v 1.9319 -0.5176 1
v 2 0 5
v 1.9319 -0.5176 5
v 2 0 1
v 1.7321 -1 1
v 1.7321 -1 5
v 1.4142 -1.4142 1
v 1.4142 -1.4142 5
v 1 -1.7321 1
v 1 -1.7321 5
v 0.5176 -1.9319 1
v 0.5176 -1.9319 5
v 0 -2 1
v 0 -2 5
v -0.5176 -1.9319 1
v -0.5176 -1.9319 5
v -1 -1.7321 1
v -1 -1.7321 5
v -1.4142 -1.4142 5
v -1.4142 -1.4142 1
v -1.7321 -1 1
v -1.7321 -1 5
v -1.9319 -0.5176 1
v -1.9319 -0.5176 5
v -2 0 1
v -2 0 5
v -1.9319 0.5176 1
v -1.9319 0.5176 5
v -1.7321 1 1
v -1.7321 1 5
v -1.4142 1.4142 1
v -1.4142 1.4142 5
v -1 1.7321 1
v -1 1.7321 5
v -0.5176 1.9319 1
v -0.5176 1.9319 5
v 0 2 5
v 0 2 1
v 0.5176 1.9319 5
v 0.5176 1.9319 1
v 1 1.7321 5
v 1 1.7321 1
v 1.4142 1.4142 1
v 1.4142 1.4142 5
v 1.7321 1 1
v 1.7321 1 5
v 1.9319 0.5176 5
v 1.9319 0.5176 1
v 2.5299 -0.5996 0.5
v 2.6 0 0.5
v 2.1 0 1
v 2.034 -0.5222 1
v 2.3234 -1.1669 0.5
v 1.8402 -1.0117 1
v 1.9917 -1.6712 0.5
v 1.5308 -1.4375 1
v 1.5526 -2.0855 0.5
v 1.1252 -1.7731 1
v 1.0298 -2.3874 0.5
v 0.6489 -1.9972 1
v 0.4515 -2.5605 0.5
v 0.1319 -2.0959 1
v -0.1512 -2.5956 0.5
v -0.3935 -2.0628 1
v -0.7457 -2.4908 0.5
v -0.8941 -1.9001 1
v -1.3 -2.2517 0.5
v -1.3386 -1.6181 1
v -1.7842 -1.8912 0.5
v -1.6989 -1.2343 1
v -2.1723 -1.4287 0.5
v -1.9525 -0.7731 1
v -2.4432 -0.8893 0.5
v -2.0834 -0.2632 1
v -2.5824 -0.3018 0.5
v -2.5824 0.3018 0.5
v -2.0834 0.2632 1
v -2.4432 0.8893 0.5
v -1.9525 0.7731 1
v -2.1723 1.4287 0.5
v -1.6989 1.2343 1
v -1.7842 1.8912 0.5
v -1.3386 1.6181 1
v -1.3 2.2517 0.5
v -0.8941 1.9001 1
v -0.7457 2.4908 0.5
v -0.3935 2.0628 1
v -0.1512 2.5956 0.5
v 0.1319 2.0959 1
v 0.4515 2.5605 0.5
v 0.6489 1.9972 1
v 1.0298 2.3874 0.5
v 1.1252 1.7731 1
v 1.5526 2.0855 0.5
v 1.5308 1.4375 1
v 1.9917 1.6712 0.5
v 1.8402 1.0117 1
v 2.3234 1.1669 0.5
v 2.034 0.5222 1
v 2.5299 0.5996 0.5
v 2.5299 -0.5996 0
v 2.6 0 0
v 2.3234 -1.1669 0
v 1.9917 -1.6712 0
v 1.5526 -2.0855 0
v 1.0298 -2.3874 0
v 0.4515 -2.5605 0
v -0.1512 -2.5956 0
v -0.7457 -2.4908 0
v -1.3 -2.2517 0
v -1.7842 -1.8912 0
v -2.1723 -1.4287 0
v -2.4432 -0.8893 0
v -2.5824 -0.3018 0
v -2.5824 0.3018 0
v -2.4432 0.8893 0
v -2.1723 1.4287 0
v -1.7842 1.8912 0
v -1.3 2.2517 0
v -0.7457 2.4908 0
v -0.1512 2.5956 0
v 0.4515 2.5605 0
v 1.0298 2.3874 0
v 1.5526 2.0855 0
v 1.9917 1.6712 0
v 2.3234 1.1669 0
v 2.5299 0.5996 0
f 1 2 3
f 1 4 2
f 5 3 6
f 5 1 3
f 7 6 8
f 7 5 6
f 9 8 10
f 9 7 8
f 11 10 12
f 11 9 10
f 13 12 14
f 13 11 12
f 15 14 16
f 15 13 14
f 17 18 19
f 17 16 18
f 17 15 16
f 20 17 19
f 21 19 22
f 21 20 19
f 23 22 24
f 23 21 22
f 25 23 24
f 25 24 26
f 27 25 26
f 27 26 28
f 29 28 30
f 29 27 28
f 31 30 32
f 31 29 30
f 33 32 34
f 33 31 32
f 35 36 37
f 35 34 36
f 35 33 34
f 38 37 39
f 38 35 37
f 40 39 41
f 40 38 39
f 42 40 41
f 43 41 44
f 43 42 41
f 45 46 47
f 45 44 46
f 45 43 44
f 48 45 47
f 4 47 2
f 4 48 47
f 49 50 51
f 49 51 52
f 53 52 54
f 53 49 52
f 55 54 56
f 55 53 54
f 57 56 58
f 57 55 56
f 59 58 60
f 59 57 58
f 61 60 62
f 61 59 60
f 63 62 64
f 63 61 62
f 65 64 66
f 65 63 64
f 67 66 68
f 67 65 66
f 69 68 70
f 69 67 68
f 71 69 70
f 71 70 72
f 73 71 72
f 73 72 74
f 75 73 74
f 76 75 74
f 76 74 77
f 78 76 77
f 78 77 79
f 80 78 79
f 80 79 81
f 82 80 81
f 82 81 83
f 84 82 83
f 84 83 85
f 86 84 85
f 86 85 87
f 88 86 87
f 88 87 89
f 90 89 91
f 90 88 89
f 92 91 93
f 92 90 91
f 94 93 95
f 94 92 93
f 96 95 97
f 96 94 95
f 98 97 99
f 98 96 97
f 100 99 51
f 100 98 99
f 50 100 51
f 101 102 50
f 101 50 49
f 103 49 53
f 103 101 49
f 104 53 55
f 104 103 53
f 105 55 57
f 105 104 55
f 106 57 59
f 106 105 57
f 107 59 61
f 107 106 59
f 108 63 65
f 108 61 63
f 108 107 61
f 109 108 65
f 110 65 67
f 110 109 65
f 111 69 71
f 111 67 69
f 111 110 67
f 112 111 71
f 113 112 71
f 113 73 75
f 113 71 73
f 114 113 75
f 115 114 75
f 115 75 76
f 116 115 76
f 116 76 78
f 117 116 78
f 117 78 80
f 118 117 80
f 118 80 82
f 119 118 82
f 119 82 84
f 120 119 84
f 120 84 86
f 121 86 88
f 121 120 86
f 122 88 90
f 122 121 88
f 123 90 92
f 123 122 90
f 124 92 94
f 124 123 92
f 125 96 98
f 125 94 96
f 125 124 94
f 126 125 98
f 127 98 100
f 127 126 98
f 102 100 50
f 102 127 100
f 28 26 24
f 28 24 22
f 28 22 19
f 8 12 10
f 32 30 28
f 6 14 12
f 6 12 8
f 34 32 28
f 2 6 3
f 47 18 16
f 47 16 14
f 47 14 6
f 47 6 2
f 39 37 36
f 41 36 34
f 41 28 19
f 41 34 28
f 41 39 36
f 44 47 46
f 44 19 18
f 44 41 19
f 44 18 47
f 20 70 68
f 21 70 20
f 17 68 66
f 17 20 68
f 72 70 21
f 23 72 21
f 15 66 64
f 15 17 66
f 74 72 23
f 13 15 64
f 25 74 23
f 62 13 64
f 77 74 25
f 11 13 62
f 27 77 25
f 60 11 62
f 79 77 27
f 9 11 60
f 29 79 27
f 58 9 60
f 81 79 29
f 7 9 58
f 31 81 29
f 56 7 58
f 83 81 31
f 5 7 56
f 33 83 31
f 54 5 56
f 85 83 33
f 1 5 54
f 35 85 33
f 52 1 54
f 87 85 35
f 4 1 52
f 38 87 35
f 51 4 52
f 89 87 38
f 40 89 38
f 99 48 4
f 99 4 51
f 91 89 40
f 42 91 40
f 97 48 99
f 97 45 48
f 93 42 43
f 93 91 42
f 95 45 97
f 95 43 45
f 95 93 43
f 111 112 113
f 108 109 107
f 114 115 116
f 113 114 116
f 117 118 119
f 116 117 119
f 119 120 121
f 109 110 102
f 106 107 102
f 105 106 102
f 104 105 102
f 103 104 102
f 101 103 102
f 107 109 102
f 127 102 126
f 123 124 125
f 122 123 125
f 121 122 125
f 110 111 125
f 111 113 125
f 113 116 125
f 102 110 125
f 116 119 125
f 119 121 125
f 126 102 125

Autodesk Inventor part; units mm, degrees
ref_plane "YZ Plane" through (0, 0, 0) normal (1, 0, 0) x (0, 1, 0)
ref_plane "XZ Plane" through (0, 0, 0) normal (0, 1, 0) x (-1, 0, 0)
ref_plane "XY Plane" through (0, 0, 0) normal (0, 0, 1) x (1, 0, 0)
sketch "Sketch1" plane through (0, 0, 0) normal (0, 0, 1) x (1, 0, 0)
  circle A0 centre (0, 0) radius 2.6
  dimension "d0" = 5.2
extrude "Extrusion1" add sketch "Sketch1" along normal blind 1
sketch "Sketch2" plane through (0, 0, 1) normal (0, 0, 1) x (1, 0, 0)
  circle A0 centre (0, 0) radius 2
  dimension "d3" = 4
extrude "Extrusion2" add sketch "Sketch2" along normal blind 4
thread "Thread1" size "M4x0.7" class "6g" standard "ANSI Metric M Profile" full length
chamfer "Chamfer2" distance 0.5 angle 45 1 edges at (-2.6, 0, 1)
properties part number "M4x5flat"
